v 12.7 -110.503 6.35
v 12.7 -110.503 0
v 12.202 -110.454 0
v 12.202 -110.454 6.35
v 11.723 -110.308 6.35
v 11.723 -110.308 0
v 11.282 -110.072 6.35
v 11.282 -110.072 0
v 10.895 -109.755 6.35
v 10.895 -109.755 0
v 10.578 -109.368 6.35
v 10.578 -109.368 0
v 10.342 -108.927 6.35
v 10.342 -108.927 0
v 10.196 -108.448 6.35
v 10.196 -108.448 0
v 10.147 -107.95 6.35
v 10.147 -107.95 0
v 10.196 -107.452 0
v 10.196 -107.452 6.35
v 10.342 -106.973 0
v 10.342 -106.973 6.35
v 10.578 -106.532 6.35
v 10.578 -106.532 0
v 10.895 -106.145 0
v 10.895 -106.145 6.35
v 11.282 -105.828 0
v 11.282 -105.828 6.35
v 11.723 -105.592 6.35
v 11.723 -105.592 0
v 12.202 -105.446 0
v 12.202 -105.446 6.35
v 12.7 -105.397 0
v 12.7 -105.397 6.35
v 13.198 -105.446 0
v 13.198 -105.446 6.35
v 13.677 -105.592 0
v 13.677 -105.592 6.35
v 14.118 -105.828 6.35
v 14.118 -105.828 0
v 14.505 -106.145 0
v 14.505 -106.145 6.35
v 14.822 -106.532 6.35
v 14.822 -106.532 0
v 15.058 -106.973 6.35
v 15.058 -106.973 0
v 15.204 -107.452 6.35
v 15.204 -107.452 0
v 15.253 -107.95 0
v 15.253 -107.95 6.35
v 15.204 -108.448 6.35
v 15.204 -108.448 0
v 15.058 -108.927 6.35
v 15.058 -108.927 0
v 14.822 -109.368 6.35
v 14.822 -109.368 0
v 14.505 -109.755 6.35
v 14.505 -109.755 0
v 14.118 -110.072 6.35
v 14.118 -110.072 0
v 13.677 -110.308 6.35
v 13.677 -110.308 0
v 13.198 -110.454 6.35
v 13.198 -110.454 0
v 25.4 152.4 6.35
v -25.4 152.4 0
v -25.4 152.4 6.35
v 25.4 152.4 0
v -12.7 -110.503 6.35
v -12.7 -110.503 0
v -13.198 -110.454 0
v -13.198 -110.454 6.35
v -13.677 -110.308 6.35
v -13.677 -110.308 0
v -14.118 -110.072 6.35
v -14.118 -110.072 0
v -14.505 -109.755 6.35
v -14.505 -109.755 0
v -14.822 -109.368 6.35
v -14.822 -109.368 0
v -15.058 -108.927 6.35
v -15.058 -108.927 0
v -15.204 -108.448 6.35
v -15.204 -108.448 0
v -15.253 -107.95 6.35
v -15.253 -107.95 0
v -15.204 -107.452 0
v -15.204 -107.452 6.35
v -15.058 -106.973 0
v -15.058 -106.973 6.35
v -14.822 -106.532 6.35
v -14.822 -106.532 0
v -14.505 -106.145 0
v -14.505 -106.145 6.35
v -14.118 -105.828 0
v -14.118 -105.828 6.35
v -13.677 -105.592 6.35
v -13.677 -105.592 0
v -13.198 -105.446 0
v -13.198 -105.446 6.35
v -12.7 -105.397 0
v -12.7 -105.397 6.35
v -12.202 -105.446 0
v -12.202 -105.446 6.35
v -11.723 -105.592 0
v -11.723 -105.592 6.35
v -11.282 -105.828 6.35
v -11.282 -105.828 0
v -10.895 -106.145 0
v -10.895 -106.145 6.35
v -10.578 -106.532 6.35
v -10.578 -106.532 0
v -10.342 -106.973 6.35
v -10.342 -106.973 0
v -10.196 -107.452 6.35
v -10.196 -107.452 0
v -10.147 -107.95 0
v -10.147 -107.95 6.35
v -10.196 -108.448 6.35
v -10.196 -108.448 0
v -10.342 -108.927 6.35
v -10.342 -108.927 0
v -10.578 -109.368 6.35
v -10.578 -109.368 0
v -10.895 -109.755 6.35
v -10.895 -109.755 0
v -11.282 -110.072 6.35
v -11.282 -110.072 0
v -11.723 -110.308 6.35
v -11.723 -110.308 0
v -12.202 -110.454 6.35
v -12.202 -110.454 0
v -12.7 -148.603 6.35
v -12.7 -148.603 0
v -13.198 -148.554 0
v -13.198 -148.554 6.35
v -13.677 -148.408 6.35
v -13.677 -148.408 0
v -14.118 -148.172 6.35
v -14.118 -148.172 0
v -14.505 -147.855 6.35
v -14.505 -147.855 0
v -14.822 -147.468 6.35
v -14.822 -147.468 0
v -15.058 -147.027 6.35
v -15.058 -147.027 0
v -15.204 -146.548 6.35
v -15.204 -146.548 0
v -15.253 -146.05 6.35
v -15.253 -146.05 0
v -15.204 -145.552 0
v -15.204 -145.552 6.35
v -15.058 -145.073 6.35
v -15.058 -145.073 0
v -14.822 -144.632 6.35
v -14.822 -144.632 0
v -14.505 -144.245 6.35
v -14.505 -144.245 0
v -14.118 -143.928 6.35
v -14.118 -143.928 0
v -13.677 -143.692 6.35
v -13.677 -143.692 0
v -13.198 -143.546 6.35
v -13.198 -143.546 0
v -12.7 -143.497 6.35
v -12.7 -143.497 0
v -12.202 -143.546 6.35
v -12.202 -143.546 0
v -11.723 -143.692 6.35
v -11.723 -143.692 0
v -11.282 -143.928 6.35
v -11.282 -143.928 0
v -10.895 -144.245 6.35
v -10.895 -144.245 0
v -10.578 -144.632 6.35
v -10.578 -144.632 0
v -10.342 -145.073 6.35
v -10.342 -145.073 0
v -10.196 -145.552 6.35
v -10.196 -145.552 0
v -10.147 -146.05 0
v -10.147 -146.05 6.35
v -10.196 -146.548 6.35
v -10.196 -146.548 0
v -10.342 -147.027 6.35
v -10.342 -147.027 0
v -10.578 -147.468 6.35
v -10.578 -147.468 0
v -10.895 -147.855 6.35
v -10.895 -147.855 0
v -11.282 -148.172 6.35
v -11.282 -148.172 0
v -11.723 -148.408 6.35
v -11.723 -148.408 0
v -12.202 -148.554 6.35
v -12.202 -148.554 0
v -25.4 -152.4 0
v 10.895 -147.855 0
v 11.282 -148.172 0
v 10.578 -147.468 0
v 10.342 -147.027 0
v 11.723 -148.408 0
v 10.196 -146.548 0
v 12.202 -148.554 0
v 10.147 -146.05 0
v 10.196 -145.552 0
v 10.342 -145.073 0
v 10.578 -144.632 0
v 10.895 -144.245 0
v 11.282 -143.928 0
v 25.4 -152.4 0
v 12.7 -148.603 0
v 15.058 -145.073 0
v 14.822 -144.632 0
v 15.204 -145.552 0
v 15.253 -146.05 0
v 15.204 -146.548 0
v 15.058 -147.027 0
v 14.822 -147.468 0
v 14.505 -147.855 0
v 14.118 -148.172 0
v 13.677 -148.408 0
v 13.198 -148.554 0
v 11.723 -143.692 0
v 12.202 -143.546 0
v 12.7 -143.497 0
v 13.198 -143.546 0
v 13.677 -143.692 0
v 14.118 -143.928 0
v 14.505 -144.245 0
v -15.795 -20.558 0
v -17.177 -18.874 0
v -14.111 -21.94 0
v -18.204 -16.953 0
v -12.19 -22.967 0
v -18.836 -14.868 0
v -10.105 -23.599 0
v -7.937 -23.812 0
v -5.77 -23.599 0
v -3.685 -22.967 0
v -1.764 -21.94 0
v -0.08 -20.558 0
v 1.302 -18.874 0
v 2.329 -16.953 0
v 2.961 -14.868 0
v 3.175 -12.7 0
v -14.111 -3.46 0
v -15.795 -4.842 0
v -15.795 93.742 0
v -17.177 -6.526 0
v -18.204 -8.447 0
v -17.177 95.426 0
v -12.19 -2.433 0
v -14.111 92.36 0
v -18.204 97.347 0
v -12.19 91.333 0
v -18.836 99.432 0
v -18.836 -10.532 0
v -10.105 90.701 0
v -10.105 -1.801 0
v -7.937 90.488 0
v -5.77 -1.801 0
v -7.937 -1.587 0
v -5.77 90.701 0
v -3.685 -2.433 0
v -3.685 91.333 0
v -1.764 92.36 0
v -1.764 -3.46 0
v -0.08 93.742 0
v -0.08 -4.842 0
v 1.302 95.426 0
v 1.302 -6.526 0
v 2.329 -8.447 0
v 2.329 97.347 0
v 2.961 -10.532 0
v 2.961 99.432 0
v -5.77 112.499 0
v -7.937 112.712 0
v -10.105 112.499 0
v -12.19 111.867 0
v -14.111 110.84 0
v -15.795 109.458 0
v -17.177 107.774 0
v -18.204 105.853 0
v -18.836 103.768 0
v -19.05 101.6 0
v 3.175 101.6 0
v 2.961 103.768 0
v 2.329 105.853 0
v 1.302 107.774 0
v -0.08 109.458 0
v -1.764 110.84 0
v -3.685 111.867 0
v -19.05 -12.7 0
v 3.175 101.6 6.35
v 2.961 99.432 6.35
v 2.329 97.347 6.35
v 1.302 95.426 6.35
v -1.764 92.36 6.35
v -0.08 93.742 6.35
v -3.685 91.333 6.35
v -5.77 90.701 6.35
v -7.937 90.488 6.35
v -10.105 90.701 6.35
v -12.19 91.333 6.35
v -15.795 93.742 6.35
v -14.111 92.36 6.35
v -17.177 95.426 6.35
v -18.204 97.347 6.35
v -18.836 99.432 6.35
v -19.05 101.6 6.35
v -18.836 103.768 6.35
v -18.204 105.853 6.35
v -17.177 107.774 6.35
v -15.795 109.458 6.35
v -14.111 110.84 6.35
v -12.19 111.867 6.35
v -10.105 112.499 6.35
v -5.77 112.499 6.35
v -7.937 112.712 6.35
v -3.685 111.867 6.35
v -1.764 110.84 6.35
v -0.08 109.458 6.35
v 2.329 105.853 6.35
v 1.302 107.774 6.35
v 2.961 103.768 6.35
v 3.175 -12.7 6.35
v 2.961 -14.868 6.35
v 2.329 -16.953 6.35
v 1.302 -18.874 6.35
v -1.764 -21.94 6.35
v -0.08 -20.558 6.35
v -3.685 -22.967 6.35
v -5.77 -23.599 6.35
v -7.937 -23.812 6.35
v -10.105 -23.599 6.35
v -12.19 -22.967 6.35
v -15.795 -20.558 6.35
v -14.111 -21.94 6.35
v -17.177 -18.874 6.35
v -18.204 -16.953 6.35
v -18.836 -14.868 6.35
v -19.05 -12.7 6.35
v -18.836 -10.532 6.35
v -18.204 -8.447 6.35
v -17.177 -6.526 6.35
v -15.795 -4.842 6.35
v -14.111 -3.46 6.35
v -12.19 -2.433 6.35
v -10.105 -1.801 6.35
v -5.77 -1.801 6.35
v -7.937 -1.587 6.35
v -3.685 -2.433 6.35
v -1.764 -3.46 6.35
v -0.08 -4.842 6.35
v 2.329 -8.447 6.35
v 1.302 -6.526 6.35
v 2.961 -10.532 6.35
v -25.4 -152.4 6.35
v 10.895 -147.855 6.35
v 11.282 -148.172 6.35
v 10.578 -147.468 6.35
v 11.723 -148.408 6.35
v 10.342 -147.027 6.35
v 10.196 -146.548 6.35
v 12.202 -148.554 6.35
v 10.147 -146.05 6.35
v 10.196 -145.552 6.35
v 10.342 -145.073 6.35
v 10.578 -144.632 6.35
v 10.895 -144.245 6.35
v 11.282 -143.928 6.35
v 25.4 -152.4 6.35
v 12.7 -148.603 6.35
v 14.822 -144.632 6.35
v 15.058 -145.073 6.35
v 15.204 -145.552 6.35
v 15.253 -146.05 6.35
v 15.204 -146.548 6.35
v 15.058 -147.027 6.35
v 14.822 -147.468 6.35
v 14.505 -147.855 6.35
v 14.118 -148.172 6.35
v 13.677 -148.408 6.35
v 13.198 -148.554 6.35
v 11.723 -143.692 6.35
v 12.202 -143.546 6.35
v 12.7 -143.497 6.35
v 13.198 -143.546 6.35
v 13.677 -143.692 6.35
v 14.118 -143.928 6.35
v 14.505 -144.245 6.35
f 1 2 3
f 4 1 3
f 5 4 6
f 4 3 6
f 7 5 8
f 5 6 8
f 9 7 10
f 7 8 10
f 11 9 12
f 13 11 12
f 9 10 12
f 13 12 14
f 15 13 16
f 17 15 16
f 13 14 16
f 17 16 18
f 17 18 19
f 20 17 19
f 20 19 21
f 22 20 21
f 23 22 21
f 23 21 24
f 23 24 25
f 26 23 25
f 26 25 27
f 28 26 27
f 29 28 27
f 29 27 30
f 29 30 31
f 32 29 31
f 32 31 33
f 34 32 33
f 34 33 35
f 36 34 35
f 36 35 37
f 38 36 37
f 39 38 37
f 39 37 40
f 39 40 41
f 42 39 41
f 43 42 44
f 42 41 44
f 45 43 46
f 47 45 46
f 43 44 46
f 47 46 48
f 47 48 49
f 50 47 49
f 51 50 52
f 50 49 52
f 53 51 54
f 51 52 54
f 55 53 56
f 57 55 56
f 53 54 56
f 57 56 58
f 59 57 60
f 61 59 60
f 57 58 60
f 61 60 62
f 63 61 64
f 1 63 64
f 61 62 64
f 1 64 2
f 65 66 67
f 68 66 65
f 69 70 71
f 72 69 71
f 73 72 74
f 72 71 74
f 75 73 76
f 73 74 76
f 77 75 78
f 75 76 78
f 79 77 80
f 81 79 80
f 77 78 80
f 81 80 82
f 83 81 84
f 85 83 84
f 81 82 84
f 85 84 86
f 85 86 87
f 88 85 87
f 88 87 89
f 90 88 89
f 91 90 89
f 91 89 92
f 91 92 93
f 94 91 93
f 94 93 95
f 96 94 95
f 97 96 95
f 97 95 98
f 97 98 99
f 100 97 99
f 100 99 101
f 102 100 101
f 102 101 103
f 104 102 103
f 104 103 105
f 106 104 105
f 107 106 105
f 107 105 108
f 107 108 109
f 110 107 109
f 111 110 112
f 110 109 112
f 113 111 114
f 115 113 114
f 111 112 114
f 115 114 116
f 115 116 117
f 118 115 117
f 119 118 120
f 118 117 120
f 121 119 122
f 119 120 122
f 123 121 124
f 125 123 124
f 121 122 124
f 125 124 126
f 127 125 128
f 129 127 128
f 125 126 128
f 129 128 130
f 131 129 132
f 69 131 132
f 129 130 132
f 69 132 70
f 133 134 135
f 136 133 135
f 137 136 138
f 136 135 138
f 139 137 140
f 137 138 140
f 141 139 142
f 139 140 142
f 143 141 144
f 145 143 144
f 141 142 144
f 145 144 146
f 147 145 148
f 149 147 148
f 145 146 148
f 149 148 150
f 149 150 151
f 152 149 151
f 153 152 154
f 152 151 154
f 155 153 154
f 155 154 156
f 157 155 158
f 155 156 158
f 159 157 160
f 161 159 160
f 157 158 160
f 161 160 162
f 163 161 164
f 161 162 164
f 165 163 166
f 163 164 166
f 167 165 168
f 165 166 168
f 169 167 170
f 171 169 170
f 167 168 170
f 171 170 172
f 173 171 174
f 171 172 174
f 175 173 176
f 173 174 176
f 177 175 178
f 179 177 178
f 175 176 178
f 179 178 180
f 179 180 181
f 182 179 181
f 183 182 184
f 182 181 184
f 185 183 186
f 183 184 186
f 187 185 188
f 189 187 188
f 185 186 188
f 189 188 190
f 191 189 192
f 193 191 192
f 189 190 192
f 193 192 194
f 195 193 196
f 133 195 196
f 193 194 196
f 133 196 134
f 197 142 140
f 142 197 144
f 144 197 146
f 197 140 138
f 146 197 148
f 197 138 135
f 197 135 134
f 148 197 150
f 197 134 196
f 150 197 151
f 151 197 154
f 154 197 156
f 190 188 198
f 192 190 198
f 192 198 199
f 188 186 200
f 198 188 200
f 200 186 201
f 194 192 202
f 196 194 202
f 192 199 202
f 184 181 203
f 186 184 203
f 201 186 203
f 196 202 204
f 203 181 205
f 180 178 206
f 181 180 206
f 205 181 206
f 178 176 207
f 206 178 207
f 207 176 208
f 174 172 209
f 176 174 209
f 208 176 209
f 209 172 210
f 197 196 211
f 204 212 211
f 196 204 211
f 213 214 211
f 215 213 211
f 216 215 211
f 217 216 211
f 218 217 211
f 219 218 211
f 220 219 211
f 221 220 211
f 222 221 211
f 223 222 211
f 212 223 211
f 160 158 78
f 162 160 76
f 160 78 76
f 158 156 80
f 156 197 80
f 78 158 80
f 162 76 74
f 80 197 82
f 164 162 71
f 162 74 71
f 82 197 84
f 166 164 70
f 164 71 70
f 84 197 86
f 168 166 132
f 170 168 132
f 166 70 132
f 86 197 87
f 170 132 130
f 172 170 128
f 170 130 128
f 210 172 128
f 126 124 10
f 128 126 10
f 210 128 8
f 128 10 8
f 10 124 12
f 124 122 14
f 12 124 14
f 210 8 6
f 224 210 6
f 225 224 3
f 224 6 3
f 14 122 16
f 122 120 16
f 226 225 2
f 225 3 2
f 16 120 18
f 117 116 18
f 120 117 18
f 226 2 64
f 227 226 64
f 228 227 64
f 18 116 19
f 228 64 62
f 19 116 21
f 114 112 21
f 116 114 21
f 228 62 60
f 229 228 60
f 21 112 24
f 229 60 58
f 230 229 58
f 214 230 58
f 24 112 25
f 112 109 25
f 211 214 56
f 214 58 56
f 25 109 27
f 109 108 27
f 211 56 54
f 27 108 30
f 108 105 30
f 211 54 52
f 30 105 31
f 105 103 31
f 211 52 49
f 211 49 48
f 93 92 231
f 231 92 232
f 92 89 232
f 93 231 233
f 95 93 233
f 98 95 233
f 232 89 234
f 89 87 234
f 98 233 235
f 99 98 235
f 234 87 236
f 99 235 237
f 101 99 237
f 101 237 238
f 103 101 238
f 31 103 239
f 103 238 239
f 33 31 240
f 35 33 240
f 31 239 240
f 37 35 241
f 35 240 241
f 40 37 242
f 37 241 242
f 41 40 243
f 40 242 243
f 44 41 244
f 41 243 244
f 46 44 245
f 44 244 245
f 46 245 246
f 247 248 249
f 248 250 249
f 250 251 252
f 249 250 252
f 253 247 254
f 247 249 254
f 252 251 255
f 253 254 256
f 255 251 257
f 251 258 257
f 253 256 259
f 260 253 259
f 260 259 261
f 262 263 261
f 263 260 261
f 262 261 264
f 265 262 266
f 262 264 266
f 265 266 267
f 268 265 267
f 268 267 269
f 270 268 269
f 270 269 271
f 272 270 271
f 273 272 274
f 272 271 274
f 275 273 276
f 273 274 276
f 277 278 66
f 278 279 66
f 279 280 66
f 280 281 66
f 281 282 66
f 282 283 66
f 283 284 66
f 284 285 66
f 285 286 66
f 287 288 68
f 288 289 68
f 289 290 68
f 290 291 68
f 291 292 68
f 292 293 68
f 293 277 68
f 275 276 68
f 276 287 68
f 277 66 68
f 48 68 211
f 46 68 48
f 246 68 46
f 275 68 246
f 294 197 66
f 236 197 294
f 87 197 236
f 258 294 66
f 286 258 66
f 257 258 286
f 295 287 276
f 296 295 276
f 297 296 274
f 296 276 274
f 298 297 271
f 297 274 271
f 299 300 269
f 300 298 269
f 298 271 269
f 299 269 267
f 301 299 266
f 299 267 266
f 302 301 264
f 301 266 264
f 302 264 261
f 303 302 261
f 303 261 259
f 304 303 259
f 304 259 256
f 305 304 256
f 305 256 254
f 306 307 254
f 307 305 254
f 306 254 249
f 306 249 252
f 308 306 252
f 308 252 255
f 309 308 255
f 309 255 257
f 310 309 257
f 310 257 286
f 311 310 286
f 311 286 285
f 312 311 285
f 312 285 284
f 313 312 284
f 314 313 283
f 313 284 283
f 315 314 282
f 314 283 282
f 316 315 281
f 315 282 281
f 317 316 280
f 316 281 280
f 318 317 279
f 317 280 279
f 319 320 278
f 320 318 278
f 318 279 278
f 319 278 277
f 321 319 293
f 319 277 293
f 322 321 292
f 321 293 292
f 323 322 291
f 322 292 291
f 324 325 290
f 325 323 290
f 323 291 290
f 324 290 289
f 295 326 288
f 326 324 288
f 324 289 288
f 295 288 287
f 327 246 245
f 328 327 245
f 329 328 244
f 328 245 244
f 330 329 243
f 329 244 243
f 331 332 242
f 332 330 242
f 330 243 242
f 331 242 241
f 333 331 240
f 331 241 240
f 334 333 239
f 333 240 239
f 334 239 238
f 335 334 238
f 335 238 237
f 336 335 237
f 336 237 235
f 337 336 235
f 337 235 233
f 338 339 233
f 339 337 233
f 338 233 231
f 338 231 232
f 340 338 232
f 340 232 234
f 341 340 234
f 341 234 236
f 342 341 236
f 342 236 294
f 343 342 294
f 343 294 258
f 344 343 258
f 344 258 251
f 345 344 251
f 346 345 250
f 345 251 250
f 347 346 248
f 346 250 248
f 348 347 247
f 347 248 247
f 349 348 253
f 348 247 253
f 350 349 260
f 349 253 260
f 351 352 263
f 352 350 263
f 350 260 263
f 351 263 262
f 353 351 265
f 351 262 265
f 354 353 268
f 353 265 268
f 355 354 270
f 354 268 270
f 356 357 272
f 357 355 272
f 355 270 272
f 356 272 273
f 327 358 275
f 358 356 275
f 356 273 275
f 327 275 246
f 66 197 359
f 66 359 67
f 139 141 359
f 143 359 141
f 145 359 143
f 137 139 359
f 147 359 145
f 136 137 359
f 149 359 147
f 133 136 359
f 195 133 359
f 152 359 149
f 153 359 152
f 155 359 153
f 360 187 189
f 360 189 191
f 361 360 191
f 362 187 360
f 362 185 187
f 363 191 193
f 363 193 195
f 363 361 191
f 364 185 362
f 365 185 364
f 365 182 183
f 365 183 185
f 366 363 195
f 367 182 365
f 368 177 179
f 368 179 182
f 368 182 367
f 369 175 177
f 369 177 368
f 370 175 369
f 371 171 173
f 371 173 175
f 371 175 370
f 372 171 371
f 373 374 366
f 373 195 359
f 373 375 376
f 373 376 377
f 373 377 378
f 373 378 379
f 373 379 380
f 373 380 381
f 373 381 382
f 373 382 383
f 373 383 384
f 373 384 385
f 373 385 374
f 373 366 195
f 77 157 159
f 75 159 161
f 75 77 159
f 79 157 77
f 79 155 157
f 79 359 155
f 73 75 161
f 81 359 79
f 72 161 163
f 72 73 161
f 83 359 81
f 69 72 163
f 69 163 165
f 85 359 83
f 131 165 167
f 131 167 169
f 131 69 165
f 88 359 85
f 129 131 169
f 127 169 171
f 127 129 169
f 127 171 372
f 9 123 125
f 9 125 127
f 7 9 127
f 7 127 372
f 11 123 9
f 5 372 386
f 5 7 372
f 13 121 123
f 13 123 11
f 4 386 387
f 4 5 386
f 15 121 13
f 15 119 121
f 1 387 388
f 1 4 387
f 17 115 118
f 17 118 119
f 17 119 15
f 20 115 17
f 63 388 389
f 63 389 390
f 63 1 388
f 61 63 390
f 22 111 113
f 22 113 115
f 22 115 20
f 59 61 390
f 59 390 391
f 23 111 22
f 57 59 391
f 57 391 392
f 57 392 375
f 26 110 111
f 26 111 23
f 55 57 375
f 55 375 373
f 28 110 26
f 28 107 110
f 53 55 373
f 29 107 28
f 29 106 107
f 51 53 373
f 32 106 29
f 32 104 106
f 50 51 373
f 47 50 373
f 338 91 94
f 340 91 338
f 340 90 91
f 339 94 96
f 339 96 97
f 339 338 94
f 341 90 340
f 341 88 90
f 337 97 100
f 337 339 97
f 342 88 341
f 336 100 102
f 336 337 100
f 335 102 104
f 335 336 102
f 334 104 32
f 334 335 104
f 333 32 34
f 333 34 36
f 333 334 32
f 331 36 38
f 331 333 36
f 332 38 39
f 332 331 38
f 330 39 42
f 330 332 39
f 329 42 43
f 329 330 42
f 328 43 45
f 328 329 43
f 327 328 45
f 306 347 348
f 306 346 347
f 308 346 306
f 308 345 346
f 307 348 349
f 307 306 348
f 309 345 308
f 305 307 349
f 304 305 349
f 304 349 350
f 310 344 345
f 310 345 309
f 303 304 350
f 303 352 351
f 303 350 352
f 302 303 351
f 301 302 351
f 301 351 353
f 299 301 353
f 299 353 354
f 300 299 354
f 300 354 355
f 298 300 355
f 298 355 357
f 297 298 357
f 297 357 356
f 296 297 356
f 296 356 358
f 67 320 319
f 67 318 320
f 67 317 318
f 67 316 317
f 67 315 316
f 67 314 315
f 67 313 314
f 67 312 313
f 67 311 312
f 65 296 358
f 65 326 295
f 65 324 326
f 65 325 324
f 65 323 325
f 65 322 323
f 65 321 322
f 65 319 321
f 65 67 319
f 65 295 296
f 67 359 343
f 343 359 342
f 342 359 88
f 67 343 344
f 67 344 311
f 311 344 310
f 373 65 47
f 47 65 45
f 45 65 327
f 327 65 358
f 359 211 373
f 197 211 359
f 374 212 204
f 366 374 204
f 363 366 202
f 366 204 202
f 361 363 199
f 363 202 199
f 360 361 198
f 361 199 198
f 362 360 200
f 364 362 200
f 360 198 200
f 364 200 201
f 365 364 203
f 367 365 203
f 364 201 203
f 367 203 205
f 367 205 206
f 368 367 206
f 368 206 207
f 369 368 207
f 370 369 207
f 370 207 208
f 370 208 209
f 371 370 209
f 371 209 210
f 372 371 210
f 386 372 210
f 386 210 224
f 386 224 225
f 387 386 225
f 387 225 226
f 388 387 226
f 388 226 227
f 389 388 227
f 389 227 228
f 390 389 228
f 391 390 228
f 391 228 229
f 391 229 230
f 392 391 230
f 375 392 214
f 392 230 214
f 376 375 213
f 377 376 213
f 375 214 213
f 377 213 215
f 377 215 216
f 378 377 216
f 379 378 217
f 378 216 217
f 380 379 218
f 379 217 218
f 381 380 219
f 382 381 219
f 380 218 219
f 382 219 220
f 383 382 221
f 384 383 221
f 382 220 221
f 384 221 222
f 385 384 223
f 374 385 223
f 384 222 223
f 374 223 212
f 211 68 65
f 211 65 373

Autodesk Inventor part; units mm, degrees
ref_plane "YZ Plane" through (0, 0, 0) normal (1, 0, 0) x (0, 1, 0)
ref_plane "XZ Plane" through (0, 0, 0) normal (0, 1, 0) x (-1, 0, 0)
ref_plane "XY Plane" through (0, 0, 0) normal (0, 0, 1) x (1, 0, 0)
sketch "Sketch1" plane through (0, 0, 0) normal (0, 0, 1) x (1, 0, 0)
  line L0 (-25.4, 152.4) -> (25.4, 152.4)
  line L1 (25.4, 152.4) -> (25.4, -152.4)
  line L2 (25.4, -152.4) -> (-25.4, -152.4)
  line L3 (-25.4, -152.4) -> (-25.4, 152.4)
  line L4 (-25.4, 152.4) -> (25.4, -152.4) construction
  line L5 (25.4, 152.4) -> (-25.4, -152.4) construction
  circle A0 centre (-7.9375, -12.7) radius 25.4 construction
  circle A1 centre (-7.9375, -12.7) radius 11.1125
  circle A2 centre (-7.9375, -12.7) radius 38.1 construction
  circle A3 centre (-7.9375, -12.7) radius 50.8 construction
  circle A4 centre (-7.9375, 101.6) radius 25.4 construction
  circle A5 centre (-7.9375, 101.6) radius 11.1125
  circle A6 centre (-7.9375, 101.6) radius 38.1 construction
  circle A7 centre (-7.9375, 101.6) radius 50.8 construction
  point P0 (0, 0)
  dimension "d0" = 50.8
  dimension "d1" = 304.8
  dimension "d3" = 50.8
  dimension "d4" = 22.225
  dimension "d7" = 17.4625
  dimension "d8" = 76.2
  dimension "d9" = 101.6
  dimension "d10" = 50.8
  dimension "d11" = 22.225
  dimension "d12" = 76.2
  dimension "d13" = 101.6
  dimension "d14" = 114.3
  dimension "d15" = 139.7
extrude "Extrusion1" add sketch "Sketch1" along normal blind 6.35
sketch "Sketch2" plane through (0, 0, 6.35) normal (0, 0, 1) x (1, 0, 0)
  line L0 (-25.4, 152.4) -> (-25.4, -152.4) construction
  line L1 (-12.7, -107.95) -> (12.7, -107.95) construction
  line L2 (-25.4, -152.4) -> (25.4, -152.4) construction
  point P0 (0, 0)
  point P1 (-12.7, -146.05)
  point P2 (12.7, -146.05)
  point P3 (0, -107.95)
  dimension "d19" = 25.4
  dimension "d21" = 38.1
  dimension "d22" = 6.35
hole "Hole1" at (-12.7, -107.95, 6.35) at (12.7, -107.95, 6.35) at (-12.7, -146.05, 6.35) at (12.7, -146.05, 6.35) direction (0, 0, -1) diameter 5.1054 end through all clearance for "Flat Head Machine Screw (82)" size "#10" standard "Ansi Unified Screw Threads"
properties part number "GP1-002" material "Aluminum 6061"
